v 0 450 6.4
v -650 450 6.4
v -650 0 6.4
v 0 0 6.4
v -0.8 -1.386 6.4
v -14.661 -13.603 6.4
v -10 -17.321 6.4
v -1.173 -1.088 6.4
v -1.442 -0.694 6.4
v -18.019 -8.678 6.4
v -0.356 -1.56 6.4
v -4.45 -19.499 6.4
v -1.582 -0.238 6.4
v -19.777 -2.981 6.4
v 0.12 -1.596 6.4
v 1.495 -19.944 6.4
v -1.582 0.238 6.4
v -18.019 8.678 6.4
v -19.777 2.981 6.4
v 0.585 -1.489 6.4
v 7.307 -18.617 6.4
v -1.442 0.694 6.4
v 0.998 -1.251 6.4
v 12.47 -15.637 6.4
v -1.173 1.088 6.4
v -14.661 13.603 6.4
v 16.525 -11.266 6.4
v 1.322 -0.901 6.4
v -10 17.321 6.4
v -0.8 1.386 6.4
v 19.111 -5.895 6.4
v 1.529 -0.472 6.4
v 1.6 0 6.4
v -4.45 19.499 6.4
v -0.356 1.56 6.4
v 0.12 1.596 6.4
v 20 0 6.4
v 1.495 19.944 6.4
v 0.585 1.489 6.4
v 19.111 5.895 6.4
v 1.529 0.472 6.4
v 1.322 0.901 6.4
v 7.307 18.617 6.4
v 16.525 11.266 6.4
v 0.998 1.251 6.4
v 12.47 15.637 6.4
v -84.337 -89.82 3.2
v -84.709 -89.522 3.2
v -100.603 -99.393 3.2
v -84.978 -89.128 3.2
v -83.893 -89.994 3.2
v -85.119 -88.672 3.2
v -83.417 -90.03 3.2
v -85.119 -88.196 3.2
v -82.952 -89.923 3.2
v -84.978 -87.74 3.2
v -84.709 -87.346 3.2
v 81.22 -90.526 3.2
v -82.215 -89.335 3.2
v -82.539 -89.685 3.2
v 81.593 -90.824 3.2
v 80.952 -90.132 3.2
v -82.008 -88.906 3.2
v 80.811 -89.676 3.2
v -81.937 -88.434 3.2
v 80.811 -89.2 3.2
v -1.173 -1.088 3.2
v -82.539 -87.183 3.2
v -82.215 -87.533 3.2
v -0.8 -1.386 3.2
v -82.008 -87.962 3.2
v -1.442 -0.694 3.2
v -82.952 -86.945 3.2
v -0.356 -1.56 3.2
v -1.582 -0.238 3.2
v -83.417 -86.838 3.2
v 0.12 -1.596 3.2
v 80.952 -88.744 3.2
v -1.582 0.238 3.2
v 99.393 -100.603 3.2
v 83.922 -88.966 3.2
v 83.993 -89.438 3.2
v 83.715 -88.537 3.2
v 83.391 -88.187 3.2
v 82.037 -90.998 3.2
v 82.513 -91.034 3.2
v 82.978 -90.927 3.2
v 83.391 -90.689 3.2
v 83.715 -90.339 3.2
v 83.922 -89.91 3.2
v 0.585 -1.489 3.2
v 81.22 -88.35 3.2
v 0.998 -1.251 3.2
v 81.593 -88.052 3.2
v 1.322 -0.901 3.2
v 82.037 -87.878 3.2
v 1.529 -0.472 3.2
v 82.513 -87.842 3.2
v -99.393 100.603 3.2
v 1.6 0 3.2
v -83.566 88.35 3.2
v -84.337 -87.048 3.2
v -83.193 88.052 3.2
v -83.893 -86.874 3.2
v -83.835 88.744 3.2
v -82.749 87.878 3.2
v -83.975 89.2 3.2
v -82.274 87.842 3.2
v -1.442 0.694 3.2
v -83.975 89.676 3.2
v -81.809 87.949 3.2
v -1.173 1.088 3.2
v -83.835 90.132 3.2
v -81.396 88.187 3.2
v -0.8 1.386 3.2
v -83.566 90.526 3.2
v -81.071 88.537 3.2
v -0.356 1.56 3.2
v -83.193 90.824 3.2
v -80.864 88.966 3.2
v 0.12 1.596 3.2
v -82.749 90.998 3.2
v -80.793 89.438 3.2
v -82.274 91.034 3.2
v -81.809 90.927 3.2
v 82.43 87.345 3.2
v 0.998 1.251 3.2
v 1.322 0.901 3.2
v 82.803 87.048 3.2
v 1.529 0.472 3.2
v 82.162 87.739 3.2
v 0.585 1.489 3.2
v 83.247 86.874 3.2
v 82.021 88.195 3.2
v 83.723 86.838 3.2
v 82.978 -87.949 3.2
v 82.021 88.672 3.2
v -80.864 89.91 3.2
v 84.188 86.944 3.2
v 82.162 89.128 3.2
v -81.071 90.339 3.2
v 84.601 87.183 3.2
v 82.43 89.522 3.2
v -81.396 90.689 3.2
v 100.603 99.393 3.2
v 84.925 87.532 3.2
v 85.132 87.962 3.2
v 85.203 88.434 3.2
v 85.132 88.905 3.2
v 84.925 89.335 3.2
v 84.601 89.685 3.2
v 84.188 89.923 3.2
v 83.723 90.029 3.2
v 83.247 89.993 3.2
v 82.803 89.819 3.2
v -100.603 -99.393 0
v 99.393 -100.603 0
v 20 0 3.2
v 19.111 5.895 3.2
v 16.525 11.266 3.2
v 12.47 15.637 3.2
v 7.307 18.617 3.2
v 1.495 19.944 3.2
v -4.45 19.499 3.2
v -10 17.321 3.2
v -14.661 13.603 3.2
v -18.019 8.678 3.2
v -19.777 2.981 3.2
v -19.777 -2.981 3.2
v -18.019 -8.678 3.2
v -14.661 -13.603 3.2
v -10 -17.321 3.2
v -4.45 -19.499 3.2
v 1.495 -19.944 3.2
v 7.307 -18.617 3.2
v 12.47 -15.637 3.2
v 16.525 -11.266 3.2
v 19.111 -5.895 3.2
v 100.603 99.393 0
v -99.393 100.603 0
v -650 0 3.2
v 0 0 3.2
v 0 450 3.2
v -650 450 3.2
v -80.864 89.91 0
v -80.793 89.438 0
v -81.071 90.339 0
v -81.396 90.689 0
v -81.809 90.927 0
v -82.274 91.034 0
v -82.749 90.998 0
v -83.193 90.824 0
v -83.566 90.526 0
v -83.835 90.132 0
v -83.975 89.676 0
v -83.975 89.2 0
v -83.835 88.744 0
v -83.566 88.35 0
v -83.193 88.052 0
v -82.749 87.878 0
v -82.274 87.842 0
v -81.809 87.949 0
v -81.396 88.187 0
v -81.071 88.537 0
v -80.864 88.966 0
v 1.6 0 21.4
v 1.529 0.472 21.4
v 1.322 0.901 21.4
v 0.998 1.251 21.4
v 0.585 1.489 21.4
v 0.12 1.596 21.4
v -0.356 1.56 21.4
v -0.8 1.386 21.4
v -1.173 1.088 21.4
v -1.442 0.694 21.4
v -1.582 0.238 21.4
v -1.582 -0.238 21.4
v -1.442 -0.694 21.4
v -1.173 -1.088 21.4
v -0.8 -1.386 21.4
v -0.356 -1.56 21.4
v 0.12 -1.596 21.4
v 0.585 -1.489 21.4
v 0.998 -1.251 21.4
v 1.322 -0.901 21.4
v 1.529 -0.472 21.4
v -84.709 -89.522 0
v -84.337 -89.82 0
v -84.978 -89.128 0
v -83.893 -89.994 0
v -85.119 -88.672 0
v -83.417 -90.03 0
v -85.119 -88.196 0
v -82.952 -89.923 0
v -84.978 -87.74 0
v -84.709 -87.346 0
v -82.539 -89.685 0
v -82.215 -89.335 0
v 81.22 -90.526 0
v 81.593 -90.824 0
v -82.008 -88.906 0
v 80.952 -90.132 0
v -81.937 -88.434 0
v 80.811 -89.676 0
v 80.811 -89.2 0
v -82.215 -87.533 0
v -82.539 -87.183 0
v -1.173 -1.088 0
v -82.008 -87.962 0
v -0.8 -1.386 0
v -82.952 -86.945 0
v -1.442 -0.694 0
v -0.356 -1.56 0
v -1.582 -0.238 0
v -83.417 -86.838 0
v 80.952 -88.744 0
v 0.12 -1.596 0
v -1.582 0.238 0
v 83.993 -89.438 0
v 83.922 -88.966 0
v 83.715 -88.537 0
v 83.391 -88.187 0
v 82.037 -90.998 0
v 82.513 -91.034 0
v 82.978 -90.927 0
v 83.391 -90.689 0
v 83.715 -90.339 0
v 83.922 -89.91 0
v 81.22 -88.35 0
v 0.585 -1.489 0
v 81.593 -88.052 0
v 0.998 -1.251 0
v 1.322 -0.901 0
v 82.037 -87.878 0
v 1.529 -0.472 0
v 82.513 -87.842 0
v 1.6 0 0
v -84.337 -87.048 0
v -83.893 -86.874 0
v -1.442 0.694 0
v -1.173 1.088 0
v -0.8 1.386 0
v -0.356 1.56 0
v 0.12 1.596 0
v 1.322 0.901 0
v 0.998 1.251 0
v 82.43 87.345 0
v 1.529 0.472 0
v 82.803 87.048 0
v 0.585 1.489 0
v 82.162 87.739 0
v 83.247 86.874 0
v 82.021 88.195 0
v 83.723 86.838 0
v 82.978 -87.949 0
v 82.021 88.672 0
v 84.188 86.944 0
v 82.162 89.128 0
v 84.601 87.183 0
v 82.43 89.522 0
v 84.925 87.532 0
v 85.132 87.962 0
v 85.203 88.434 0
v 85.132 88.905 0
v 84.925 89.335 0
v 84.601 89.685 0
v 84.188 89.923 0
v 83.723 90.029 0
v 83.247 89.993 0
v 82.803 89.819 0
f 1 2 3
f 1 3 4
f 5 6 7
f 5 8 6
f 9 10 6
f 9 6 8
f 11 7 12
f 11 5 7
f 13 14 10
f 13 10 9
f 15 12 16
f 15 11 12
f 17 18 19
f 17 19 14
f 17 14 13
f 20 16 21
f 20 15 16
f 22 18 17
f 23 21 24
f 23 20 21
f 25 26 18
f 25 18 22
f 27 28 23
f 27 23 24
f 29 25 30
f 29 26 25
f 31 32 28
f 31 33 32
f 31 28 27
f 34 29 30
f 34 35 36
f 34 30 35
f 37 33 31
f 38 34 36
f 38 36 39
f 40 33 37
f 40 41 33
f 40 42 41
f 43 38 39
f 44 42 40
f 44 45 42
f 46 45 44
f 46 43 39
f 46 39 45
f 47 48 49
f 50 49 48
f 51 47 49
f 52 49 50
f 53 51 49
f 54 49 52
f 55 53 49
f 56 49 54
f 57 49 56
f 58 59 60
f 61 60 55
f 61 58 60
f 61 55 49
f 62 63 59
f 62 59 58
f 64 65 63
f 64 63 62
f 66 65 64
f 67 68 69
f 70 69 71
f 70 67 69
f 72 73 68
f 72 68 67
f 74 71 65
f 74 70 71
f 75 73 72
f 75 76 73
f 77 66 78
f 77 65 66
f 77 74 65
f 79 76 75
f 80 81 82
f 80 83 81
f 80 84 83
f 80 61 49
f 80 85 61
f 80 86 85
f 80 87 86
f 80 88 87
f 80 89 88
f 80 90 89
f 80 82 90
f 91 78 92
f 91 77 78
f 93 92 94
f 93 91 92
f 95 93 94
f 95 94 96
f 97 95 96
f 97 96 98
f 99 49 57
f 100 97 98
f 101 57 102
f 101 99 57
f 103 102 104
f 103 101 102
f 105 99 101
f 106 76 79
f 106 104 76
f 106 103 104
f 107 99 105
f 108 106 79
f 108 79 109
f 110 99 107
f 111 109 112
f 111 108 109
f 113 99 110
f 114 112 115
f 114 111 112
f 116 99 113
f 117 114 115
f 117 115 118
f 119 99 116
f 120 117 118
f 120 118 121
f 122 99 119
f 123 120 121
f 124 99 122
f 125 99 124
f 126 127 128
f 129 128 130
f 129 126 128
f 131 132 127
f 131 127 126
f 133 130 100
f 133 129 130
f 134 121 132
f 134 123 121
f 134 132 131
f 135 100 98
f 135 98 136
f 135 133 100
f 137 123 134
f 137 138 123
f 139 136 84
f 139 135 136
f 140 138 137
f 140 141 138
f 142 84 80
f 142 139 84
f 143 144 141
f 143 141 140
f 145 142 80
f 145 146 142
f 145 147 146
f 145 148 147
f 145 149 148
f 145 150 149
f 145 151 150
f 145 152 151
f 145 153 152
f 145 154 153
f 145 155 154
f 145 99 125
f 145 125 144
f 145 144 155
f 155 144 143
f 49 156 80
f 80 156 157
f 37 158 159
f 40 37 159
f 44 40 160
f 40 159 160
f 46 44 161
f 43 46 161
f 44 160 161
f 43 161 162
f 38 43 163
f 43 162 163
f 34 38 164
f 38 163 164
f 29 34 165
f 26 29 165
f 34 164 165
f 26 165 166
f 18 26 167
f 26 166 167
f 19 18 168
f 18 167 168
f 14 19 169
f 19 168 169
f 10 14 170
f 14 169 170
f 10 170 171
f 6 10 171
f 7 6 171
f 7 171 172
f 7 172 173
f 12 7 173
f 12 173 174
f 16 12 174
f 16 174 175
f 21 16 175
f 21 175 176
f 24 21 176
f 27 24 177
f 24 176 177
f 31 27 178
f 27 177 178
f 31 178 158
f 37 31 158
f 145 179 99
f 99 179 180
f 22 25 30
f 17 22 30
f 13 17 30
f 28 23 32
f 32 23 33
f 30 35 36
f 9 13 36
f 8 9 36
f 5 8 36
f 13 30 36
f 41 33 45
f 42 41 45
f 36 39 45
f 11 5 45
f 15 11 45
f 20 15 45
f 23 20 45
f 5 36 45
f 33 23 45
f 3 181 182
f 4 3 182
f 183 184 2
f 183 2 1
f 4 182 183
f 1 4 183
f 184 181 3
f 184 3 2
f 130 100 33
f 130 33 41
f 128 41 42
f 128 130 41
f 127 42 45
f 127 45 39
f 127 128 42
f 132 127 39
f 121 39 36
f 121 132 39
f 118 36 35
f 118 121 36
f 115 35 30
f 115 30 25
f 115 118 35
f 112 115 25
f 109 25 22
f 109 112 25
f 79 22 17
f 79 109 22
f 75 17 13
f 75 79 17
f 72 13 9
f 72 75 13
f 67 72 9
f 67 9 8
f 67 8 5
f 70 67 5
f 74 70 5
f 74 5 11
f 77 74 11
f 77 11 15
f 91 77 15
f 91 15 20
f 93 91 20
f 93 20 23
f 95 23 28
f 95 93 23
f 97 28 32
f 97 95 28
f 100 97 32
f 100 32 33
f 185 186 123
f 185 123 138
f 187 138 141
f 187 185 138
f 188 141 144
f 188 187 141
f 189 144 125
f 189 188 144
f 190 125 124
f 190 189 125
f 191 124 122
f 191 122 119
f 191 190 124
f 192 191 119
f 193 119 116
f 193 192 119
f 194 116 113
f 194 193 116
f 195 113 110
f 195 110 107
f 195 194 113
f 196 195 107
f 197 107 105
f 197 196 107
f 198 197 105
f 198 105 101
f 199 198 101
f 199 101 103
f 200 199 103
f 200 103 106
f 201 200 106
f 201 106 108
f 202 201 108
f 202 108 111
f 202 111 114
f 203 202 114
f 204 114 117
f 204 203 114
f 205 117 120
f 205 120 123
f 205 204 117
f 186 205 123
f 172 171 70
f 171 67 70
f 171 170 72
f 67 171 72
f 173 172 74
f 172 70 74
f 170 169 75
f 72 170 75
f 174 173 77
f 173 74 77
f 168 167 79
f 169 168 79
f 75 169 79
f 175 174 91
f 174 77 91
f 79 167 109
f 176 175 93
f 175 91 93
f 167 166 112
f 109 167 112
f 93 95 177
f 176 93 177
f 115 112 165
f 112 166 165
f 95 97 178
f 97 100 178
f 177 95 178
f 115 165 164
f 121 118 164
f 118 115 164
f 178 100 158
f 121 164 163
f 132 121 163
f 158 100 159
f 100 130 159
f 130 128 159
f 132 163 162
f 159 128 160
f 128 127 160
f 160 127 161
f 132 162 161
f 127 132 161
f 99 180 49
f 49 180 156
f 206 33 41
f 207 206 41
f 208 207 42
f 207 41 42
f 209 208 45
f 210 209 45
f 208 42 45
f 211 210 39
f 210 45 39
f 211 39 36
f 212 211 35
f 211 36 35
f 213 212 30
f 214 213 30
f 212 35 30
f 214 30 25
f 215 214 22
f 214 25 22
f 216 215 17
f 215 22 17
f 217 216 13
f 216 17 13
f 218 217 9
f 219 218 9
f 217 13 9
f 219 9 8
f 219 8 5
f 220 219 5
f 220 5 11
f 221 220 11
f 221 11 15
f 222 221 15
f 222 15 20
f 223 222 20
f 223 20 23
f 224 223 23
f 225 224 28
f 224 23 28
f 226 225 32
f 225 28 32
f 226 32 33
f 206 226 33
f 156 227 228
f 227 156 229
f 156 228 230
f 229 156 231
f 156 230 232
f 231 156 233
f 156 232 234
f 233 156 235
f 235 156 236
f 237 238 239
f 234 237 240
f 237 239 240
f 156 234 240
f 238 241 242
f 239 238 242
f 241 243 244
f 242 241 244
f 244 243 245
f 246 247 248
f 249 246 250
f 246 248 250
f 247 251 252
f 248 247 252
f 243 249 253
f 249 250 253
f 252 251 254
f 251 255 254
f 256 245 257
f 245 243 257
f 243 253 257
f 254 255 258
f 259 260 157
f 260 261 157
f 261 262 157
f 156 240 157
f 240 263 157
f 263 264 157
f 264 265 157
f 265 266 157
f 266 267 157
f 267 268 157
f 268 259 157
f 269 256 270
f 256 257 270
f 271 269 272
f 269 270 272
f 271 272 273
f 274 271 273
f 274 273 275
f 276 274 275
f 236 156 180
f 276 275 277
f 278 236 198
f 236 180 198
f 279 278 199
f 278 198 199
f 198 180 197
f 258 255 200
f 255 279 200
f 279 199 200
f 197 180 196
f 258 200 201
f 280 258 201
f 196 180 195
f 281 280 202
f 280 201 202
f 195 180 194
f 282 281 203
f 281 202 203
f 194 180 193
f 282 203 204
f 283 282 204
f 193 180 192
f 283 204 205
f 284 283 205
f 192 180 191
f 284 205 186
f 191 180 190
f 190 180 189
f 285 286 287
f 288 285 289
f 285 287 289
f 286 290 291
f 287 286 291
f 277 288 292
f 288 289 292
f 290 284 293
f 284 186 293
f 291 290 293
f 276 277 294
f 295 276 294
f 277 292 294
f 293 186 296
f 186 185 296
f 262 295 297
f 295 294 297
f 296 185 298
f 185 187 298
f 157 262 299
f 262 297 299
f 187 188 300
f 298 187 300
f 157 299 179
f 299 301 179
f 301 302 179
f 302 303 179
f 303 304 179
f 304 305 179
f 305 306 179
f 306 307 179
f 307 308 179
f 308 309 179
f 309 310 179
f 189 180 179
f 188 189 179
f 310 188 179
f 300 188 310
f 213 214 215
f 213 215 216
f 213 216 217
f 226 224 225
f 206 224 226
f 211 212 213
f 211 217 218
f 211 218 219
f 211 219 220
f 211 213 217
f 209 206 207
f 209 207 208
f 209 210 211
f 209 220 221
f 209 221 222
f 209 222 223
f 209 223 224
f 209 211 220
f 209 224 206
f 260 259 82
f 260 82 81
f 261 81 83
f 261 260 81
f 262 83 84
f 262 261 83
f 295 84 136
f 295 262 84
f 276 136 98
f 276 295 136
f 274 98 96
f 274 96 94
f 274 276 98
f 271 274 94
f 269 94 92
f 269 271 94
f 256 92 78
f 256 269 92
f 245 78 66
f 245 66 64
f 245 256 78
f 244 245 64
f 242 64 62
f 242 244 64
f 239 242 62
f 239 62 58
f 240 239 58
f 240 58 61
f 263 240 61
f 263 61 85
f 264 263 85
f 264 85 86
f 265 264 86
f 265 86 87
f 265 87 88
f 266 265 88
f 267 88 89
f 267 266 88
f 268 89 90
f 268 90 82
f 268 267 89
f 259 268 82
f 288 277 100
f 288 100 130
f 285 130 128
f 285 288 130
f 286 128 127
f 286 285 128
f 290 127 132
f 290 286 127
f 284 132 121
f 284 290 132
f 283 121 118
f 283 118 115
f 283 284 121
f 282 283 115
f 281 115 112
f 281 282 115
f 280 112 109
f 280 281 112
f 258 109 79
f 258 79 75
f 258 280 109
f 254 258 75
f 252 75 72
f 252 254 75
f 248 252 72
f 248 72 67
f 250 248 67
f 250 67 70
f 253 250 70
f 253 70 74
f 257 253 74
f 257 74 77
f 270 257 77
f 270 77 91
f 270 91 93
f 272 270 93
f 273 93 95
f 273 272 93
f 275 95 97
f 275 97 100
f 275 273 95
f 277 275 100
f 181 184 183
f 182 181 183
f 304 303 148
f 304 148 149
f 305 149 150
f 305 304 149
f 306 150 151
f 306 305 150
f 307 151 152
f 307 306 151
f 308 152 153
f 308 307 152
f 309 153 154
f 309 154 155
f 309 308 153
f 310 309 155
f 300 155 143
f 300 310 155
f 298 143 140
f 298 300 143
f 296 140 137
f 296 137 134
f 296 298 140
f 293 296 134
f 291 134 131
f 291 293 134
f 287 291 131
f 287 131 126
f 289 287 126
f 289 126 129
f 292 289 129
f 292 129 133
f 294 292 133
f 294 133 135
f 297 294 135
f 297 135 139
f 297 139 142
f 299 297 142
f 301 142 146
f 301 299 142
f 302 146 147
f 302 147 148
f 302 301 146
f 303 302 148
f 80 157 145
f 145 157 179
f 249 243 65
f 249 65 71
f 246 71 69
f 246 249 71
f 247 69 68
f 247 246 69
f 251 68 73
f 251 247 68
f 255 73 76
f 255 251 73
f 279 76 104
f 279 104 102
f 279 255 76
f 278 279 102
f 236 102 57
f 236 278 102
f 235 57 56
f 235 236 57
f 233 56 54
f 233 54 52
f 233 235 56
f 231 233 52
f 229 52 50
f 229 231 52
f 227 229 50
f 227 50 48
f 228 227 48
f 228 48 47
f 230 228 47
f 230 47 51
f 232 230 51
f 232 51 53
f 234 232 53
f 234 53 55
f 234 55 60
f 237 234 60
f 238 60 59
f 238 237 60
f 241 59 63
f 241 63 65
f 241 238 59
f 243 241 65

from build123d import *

# Parameters (mm, degrees)
F0_R     = 1.6
F1_DEPTH = 3.2
F2_R     = 20
F2_R_2   = 1.6
F3_DEPTH = 3.2
F4_R     = 1.6
F5_DEPTH = 15
F6_W     = 650
F6_H     = 450
F7_DEPTH = 3.2


with BuildPart() as f1:
    # F0 (on Top) → F1 (new body)
    with BuildSketch(Plane.XY):
        Polygon((100.6032389982, 99.3930998765), (-99.3930998765, 100.6032389982), (-100.6032389982, -99.3930998765), (99.3930998765, -100.6032389982), align=None)
        with Locations((-83.5366163231, -88.4339863755)):
            Circle(F0_R, mode=Mode.SUBTRACT)
        Circle(F0_R, mode=Mode.SUBTRACT)
        with Locations((82.3932280159, -89.4379957349)):
            Circle(F0_R, mode=Mode.SUBTRACT)
        with Locations((-82.3932280159, 89.4379957349)):
            Circle(F0_R, mode=Mode.SUBTRACT)
        with Locations((83.6033671376, 88.4335824792)):
            Circle(F0_R, mode=Mode.SUBTRACT)
    extrude(amount=F1_DEPTH)


with BuildPart() as f3:
    # F2 (on face) → F3 (new body)
    with BuildSketch(Plane.XY.offset(3.2)):
        Circle(F2_R)
        Circle(F2_R_2, mode=Mode.SUBTRACT)
    extrude(amount=F3_DEPTH)


with BuildPart() as f5:
    # F4 (on face) → F5 (new body)
    with BuildSketch(Plane.XY.offset(6.4)):
        Circle(F4_R)
    extrude(amount=F5_DEPTH)


with BuildPart() as f7:
    # F6 (on face) → F7 (new body)
    with BuildSketch(Plane.XY.offset(3.2)):
        with Locations((-325, 225)):
            Rectangle(F6_W, F6_H)
    extrude(amount=F7_DEPTH)


solid = Compound([f1.part, f3.part, f5.part, f7.part])
